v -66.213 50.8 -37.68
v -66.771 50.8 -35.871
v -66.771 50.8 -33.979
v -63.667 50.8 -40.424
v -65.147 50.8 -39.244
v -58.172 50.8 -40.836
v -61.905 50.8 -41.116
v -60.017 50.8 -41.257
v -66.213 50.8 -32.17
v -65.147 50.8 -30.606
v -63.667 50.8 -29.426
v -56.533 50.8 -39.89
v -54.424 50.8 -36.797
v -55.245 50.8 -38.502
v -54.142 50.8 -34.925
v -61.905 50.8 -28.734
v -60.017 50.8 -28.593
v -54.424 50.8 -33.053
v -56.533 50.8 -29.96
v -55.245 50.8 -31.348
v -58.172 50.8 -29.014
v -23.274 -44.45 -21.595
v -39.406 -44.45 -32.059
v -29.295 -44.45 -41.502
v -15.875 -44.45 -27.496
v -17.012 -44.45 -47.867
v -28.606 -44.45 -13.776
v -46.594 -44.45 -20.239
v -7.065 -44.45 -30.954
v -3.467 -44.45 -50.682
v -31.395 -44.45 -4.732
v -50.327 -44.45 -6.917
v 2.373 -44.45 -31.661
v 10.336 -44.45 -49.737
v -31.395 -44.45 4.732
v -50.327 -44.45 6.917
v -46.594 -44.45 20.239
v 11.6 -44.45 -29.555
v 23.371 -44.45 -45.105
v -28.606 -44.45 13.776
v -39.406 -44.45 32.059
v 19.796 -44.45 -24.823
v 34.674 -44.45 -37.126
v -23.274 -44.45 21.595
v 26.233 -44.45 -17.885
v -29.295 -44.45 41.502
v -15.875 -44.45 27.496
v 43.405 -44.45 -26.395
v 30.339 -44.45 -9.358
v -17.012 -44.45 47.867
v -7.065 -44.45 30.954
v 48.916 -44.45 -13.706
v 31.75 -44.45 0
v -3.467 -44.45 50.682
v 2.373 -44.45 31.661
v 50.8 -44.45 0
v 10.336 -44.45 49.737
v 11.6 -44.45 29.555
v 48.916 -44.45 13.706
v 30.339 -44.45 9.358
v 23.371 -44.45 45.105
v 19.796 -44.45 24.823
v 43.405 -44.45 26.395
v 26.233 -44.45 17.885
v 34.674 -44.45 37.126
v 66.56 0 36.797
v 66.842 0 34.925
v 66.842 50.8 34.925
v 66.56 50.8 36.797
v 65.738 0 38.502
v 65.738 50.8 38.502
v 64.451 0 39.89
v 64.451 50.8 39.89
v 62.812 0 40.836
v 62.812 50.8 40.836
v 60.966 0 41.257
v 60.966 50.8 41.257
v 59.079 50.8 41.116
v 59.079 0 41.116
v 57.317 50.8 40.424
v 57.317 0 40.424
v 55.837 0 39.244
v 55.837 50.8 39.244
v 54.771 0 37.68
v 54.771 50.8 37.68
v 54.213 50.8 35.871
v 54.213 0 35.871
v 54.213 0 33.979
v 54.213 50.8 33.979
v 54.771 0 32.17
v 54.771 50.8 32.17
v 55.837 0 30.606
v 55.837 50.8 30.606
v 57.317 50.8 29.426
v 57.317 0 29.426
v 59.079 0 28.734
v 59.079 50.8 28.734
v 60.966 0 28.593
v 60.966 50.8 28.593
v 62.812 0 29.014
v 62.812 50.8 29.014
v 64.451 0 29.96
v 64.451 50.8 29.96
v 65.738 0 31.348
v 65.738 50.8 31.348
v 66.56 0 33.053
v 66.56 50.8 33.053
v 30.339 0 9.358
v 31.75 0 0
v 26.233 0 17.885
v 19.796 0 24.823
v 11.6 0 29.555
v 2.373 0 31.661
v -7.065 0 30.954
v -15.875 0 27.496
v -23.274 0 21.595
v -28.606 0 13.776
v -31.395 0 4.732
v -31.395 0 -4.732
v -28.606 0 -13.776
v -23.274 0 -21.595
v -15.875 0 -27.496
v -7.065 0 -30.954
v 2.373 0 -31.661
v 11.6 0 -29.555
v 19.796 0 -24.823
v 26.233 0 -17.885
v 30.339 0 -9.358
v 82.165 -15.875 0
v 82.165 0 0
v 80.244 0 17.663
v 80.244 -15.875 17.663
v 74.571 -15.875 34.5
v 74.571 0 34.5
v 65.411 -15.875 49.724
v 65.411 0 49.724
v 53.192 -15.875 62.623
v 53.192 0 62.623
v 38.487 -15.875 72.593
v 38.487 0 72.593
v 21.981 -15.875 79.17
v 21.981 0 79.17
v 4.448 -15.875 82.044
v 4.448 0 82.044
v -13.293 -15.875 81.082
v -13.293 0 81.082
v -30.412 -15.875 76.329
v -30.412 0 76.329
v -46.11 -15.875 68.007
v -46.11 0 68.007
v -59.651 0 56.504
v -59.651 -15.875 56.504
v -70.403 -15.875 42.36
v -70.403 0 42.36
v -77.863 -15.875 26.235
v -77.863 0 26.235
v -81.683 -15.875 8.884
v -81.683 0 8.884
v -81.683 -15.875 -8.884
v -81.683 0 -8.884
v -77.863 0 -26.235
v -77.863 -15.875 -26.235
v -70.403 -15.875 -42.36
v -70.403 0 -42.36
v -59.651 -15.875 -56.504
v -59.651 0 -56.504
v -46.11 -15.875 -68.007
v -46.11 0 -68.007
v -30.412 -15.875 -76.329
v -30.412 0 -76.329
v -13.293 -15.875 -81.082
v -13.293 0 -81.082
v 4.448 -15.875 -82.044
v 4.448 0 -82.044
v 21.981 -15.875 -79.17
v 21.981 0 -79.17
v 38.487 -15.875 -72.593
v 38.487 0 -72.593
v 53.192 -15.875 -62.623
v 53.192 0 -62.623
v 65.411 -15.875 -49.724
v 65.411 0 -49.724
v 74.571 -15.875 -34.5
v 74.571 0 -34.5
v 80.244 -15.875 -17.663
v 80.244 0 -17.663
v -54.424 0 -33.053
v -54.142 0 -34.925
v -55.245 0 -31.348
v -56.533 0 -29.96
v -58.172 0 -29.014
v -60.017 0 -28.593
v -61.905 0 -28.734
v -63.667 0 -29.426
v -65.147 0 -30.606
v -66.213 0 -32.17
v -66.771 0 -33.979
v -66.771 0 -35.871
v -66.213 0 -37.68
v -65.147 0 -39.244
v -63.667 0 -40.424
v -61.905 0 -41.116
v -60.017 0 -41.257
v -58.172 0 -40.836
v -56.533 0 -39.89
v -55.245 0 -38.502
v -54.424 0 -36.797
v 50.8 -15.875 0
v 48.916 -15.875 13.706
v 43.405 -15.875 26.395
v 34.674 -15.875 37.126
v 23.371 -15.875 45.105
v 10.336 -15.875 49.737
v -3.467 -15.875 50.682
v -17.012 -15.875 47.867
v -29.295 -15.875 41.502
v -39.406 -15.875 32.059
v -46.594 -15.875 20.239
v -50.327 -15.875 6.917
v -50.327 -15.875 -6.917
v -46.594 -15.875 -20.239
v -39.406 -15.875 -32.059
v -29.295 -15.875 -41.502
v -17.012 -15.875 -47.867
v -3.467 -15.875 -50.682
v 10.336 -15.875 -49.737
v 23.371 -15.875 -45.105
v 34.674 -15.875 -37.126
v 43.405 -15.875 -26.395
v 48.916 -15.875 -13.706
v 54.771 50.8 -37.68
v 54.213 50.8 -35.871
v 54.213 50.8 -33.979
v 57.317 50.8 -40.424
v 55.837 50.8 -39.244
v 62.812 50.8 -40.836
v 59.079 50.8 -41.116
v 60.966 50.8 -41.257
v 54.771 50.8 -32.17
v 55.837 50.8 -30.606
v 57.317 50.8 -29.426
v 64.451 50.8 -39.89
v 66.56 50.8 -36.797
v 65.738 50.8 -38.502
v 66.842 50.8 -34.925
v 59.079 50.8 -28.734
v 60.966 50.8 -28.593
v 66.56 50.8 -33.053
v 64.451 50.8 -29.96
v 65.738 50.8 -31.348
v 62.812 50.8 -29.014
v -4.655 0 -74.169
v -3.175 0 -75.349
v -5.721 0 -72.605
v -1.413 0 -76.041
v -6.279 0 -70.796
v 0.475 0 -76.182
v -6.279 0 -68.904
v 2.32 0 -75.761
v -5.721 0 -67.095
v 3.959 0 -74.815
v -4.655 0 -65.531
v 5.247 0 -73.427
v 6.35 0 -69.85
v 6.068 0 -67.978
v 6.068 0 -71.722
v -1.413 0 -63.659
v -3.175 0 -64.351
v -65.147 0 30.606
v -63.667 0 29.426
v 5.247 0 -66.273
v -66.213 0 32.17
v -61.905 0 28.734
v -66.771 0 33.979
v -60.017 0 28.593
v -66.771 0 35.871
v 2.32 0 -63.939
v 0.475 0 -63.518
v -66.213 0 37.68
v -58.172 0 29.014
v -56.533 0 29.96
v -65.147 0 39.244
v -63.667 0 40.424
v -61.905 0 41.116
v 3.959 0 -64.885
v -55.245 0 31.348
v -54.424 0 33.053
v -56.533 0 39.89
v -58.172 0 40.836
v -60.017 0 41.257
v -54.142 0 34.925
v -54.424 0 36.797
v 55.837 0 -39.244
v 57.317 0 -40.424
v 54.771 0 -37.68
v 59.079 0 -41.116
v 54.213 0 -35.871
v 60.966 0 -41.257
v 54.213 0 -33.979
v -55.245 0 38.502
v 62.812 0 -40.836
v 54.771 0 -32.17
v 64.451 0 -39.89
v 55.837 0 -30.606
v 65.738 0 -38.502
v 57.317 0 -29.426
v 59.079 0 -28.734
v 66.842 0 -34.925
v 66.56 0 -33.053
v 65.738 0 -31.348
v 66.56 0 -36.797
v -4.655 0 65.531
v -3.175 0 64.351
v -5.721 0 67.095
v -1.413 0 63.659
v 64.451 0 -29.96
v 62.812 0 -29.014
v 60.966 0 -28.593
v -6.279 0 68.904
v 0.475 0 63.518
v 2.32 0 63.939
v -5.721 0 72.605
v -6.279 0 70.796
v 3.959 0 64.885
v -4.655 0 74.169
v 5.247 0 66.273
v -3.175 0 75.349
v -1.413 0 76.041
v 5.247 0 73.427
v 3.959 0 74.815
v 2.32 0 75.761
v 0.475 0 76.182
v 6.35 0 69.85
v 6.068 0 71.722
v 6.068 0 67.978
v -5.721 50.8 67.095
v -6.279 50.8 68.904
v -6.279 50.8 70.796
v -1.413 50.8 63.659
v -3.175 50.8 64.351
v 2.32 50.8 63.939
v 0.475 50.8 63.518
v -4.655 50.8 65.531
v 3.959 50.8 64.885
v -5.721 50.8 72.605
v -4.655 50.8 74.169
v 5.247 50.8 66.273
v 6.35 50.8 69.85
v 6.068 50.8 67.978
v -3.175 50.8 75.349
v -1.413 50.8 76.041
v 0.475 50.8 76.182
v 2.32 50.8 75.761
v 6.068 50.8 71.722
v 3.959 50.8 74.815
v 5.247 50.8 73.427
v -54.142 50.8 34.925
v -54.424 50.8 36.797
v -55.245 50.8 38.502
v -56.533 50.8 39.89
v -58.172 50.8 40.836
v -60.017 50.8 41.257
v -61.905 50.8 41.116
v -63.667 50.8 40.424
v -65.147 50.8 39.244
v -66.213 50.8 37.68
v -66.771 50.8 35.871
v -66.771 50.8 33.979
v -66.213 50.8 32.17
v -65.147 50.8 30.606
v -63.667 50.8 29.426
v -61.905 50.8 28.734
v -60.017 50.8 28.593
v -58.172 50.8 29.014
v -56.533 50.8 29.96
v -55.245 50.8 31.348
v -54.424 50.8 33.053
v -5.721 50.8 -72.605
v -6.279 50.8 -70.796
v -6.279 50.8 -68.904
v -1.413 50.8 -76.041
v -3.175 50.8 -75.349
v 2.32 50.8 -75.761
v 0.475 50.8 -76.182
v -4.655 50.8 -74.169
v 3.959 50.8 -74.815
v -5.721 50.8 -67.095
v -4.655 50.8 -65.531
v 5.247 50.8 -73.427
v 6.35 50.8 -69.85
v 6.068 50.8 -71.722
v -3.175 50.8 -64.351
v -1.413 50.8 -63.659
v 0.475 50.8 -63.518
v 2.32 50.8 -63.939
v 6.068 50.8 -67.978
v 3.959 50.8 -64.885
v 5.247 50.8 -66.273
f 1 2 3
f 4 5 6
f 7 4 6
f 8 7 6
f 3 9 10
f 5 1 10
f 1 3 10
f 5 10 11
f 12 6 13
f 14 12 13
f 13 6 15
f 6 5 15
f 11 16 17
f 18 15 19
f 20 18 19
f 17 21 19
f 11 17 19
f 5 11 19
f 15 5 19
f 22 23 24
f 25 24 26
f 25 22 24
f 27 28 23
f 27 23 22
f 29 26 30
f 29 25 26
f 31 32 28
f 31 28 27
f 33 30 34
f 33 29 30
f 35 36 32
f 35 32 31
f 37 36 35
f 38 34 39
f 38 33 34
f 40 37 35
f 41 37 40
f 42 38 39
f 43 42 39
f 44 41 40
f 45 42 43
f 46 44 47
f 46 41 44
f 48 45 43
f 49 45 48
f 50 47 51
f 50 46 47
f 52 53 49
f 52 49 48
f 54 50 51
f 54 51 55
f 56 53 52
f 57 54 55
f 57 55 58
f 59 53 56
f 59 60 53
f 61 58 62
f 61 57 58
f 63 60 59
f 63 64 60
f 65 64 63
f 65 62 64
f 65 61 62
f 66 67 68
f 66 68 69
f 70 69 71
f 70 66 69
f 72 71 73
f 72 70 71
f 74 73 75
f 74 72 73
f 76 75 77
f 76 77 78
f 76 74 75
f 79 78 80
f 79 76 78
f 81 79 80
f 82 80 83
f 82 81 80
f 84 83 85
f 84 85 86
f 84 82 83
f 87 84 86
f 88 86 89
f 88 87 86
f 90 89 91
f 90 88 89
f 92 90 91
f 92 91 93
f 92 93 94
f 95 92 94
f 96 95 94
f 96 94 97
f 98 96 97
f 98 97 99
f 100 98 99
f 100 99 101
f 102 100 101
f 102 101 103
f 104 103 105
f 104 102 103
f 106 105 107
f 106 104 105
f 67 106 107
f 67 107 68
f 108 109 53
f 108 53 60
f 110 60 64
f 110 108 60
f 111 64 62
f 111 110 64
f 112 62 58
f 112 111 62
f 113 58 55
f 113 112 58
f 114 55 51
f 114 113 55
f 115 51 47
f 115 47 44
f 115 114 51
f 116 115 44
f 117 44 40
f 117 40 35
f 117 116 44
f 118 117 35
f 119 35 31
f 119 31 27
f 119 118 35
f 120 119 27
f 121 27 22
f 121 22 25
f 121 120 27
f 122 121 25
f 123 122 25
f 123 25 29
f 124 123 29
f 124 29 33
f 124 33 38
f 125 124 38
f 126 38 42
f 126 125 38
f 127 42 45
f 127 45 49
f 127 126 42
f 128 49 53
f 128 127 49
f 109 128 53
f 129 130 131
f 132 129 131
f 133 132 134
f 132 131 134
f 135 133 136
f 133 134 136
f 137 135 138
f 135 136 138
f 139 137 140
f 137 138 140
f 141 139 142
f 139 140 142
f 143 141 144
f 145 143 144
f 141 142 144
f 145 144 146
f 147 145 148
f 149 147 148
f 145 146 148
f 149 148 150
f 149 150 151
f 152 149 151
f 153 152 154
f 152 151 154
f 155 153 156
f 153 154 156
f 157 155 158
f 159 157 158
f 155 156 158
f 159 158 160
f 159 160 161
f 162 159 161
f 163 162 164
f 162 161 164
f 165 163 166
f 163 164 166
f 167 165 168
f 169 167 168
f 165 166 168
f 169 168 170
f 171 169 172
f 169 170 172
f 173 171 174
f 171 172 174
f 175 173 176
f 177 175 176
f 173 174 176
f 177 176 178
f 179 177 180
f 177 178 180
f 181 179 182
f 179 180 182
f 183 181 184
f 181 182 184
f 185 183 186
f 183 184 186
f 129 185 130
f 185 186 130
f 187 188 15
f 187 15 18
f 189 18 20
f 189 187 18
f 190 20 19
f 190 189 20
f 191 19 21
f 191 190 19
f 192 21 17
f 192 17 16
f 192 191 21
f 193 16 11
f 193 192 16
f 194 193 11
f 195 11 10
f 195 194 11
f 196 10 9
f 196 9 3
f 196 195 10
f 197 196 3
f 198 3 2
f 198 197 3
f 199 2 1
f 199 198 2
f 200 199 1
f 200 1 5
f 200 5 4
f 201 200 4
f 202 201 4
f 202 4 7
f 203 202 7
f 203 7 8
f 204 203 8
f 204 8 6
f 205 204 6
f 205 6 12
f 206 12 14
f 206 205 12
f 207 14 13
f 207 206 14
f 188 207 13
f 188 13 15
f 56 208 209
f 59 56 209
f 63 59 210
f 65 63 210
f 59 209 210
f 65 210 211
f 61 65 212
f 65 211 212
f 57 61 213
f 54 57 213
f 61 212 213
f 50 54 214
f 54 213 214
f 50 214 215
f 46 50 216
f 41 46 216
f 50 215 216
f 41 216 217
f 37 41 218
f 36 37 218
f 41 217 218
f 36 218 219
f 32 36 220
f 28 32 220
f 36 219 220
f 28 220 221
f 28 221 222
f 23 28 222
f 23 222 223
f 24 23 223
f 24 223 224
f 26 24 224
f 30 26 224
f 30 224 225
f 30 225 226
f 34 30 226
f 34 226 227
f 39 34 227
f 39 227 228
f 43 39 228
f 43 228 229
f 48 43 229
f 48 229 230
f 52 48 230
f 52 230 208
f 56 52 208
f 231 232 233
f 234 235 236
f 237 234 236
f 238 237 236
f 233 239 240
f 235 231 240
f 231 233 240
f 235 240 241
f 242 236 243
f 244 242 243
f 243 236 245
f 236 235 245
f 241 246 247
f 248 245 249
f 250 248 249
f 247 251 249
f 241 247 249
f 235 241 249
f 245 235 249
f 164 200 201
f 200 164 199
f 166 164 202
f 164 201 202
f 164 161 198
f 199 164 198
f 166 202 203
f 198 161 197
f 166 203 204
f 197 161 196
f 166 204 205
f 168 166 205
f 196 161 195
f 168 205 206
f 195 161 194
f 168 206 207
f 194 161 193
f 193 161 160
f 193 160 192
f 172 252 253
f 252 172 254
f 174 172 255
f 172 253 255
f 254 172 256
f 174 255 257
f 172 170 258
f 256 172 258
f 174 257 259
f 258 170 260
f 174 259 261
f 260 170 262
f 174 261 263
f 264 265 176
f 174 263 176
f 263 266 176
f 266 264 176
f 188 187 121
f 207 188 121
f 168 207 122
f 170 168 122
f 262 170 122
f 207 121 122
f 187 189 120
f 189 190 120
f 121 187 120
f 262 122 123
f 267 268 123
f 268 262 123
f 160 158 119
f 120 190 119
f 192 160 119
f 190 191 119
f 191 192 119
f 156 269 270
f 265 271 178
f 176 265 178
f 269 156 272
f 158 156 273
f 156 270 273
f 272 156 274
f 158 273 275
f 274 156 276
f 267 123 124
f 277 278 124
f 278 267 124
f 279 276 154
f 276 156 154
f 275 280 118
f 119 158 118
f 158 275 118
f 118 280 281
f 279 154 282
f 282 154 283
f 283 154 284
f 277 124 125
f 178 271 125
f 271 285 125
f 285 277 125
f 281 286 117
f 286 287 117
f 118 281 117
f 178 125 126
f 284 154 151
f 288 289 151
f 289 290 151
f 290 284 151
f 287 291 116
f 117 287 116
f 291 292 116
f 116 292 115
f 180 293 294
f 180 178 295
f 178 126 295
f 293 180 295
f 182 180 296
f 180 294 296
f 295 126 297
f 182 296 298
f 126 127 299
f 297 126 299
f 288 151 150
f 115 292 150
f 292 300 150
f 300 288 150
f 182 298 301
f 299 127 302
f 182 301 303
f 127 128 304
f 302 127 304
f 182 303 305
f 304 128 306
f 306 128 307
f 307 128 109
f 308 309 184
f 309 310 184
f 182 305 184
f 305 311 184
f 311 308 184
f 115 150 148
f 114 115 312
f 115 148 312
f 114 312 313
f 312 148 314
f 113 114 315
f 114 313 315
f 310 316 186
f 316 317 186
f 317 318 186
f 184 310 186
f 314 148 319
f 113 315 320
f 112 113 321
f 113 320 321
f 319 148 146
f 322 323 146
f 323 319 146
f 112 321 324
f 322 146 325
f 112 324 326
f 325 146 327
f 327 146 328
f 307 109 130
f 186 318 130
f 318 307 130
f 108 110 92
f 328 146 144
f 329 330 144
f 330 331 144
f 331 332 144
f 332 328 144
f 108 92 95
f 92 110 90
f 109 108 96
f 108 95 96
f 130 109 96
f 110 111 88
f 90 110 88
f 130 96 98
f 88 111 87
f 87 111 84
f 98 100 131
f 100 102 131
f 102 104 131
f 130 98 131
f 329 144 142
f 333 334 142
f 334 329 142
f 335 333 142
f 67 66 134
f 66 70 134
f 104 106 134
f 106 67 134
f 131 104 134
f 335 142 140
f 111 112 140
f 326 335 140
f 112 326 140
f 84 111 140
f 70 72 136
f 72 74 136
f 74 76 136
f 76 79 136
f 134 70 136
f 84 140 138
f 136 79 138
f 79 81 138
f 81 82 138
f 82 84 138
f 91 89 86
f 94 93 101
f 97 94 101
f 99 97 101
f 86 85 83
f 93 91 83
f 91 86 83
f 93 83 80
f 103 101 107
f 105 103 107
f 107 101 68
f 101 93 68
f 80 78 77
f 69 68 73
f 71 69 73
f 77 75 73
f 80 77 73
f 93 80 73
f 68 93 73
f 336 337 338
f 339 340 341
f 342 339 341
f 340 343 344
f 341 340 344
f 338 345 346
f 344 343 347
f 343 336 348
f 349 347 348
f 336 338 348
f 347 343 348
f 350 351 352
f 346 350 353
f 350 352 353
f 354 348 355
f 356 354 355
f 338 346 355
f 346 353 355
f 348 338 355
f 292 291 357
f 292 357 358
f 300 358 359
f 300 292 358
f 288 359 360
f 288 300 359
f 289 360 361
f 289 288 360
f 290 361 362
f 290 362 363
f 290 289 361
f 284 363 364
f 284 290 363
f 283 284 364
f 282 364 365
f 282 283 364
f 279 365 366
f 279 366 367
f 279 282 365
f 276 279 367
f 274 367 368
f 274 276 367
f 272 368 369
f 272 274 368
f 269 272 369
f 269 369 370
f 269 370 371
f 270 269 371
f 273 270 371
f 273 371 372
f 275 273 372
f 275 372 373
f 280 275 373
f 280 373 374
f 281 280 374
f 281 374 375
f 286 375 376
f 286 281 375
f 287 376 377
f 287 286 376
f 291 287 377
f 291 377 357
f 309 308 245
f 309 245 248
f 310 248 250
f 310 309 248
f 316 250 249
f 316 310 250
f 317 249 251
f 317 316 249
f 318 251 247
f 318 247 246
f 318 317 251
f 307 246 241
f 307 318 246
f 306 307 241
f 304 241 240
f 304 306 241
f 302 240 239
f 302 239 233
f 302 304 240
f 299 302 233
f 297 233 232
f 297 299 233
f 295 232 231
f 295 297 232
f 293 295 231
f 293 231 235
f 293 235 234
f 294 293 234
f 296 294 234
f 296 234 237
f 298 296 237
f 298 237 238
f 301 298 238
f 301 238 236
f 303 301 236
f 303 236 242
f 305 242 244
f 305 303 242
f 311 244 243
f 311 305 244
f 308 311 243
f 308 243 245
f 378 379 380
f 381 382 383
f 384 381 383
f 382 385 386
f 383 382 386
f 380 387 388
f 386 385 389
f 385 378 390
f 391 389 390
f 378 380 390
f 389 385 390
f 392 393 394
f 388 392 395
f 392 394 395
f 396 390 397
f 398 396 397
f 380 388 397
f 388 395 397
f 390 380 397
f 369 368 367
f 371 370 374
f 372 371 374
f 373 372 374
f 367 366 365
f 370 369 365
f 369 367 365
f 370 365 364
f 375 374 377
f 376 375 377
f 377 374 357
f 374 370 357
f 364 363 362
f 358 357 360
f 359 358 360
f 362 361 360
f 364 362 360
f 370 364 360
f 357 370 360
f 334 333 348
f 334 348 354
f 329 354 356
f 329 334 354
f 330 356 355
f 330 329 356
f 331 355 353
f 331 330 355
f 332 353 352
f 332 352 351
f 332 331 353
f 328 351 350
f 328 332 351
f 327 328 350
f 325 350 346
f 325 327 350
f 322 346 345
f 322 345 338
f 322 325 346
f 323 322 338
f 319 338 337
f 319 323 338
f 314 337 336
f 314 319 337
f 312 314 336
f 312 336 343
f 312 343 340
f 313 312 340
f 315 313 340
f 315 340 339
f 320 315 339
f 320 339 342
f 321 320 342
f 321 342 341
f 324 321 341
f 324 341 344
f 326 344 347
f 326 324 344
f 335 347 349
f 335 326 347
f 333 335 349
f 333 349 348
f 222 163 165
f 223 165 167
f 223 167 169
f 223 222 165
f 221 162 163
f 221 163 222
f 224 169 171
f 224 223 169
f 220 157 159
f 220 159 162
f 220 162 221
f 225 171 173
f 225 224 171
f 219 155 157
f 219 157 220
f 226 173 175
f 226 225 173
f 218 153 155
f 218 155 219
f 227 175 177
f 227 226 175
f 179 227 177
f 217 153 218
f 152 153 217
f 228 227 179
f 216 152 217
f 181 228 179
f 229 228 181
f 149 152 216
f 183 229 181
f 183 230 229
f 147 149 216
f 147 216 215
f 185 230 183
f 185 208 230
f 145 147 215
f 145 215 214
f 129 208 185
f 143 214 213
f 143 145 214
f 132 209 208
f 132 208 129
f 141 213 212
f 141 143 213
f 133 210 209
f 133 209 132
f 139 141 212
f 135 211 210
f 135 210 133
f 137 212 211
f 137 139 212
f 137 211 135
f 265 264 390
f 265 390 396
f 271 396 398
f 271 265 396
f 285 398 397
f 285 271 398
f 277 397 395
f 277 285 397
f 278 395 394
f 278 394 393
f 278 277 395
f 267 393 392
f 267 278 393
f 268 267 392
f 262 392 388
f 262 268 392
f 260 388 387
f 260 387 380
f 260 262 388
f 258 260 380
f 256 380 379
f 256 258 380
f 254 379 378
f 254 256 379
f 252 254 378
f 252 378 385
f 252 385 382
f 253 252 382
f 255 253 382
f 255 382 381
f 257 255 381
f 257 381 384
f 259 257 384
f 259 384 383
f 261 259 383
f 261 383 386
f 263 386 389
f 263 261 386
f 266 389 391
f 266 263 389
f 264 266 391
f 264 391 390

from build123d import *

# Parameters (mm, degrees)
F0_R          = 82.164523
F0_R_2        = 6.35
F0_R_3        = 50.8
F1_DEPTH      = 15.875
F0_R_4        = 31.75
F2_DEPTH      = 44.45
F3_DEPTH      = 15.875
F3_DEPTH_BACK = 50.8


with BuildPart() as f1:
    # F0 (on Front) → F1 (new body)
    with BuildSketch(Plane.XZ):
        Circle(F0_R)
        with Locations((-60.491874, -34.925)):
            Circle(F0_R_2, mode=Mode.SUBTRACT)
        with Locations((0, -69.85)):
            Circle(F0_R_2, mode=Mode.SUBTRACT)
        with Locations((60.491874, -34.925)):
            Circle(F0_R_2, mode=Mode.SUBTRACT)
        with Locations((-60.491874, 34.925)):
            Circle(F0_R_2, mode=Mode.SUBTRACT)
        Circle(F0_R_3, mode=Mode.SUBTRACT)
        with Locations((60.491874, 34.925)):
            Circle(F0_R_2, mode=Mode.SUBTRACT)
        with Locations((0, 69.85)):
            Circle(F0_R_2, mode=Mode.SUBTRACT)
    extrude(amount=F1_DEPTH)

    # F0 (on Front) → F2 (join)
    with BuildSketch(Plane.XZ):
        Circle(F0_R_3)
        Circle(F0_R_4, mode=Mode.SUBTRACT)
    extrude(amount=F2_DEPTH)

    # F0 (on Front) → F3 (join, two sides)
    with BuildSketch(Plane.XZ) as f3_sk:
        with Locations((-60.491874, 34.925)):
            Circle(F0_R_2)
        with Locations((0, 69.85)):
            Circle(F0_R_2)
        with Locations((60.491874, 34.925)):
            Circle(F0_R_2)
        with Locations((60.491874, -34.925)):
            Circle(F0_R_2)
        with Locations((0, -69.85)):
            Circle(F0_R_2)
        with Locations((-60.491874, -34.925)):
            Circle(F0_R_2)
    extrude(amount=F3_DEPTH)
    extrude(f3_sk.sketch, amount=-F3_DEPTH_BACK)


solid = f1.part
